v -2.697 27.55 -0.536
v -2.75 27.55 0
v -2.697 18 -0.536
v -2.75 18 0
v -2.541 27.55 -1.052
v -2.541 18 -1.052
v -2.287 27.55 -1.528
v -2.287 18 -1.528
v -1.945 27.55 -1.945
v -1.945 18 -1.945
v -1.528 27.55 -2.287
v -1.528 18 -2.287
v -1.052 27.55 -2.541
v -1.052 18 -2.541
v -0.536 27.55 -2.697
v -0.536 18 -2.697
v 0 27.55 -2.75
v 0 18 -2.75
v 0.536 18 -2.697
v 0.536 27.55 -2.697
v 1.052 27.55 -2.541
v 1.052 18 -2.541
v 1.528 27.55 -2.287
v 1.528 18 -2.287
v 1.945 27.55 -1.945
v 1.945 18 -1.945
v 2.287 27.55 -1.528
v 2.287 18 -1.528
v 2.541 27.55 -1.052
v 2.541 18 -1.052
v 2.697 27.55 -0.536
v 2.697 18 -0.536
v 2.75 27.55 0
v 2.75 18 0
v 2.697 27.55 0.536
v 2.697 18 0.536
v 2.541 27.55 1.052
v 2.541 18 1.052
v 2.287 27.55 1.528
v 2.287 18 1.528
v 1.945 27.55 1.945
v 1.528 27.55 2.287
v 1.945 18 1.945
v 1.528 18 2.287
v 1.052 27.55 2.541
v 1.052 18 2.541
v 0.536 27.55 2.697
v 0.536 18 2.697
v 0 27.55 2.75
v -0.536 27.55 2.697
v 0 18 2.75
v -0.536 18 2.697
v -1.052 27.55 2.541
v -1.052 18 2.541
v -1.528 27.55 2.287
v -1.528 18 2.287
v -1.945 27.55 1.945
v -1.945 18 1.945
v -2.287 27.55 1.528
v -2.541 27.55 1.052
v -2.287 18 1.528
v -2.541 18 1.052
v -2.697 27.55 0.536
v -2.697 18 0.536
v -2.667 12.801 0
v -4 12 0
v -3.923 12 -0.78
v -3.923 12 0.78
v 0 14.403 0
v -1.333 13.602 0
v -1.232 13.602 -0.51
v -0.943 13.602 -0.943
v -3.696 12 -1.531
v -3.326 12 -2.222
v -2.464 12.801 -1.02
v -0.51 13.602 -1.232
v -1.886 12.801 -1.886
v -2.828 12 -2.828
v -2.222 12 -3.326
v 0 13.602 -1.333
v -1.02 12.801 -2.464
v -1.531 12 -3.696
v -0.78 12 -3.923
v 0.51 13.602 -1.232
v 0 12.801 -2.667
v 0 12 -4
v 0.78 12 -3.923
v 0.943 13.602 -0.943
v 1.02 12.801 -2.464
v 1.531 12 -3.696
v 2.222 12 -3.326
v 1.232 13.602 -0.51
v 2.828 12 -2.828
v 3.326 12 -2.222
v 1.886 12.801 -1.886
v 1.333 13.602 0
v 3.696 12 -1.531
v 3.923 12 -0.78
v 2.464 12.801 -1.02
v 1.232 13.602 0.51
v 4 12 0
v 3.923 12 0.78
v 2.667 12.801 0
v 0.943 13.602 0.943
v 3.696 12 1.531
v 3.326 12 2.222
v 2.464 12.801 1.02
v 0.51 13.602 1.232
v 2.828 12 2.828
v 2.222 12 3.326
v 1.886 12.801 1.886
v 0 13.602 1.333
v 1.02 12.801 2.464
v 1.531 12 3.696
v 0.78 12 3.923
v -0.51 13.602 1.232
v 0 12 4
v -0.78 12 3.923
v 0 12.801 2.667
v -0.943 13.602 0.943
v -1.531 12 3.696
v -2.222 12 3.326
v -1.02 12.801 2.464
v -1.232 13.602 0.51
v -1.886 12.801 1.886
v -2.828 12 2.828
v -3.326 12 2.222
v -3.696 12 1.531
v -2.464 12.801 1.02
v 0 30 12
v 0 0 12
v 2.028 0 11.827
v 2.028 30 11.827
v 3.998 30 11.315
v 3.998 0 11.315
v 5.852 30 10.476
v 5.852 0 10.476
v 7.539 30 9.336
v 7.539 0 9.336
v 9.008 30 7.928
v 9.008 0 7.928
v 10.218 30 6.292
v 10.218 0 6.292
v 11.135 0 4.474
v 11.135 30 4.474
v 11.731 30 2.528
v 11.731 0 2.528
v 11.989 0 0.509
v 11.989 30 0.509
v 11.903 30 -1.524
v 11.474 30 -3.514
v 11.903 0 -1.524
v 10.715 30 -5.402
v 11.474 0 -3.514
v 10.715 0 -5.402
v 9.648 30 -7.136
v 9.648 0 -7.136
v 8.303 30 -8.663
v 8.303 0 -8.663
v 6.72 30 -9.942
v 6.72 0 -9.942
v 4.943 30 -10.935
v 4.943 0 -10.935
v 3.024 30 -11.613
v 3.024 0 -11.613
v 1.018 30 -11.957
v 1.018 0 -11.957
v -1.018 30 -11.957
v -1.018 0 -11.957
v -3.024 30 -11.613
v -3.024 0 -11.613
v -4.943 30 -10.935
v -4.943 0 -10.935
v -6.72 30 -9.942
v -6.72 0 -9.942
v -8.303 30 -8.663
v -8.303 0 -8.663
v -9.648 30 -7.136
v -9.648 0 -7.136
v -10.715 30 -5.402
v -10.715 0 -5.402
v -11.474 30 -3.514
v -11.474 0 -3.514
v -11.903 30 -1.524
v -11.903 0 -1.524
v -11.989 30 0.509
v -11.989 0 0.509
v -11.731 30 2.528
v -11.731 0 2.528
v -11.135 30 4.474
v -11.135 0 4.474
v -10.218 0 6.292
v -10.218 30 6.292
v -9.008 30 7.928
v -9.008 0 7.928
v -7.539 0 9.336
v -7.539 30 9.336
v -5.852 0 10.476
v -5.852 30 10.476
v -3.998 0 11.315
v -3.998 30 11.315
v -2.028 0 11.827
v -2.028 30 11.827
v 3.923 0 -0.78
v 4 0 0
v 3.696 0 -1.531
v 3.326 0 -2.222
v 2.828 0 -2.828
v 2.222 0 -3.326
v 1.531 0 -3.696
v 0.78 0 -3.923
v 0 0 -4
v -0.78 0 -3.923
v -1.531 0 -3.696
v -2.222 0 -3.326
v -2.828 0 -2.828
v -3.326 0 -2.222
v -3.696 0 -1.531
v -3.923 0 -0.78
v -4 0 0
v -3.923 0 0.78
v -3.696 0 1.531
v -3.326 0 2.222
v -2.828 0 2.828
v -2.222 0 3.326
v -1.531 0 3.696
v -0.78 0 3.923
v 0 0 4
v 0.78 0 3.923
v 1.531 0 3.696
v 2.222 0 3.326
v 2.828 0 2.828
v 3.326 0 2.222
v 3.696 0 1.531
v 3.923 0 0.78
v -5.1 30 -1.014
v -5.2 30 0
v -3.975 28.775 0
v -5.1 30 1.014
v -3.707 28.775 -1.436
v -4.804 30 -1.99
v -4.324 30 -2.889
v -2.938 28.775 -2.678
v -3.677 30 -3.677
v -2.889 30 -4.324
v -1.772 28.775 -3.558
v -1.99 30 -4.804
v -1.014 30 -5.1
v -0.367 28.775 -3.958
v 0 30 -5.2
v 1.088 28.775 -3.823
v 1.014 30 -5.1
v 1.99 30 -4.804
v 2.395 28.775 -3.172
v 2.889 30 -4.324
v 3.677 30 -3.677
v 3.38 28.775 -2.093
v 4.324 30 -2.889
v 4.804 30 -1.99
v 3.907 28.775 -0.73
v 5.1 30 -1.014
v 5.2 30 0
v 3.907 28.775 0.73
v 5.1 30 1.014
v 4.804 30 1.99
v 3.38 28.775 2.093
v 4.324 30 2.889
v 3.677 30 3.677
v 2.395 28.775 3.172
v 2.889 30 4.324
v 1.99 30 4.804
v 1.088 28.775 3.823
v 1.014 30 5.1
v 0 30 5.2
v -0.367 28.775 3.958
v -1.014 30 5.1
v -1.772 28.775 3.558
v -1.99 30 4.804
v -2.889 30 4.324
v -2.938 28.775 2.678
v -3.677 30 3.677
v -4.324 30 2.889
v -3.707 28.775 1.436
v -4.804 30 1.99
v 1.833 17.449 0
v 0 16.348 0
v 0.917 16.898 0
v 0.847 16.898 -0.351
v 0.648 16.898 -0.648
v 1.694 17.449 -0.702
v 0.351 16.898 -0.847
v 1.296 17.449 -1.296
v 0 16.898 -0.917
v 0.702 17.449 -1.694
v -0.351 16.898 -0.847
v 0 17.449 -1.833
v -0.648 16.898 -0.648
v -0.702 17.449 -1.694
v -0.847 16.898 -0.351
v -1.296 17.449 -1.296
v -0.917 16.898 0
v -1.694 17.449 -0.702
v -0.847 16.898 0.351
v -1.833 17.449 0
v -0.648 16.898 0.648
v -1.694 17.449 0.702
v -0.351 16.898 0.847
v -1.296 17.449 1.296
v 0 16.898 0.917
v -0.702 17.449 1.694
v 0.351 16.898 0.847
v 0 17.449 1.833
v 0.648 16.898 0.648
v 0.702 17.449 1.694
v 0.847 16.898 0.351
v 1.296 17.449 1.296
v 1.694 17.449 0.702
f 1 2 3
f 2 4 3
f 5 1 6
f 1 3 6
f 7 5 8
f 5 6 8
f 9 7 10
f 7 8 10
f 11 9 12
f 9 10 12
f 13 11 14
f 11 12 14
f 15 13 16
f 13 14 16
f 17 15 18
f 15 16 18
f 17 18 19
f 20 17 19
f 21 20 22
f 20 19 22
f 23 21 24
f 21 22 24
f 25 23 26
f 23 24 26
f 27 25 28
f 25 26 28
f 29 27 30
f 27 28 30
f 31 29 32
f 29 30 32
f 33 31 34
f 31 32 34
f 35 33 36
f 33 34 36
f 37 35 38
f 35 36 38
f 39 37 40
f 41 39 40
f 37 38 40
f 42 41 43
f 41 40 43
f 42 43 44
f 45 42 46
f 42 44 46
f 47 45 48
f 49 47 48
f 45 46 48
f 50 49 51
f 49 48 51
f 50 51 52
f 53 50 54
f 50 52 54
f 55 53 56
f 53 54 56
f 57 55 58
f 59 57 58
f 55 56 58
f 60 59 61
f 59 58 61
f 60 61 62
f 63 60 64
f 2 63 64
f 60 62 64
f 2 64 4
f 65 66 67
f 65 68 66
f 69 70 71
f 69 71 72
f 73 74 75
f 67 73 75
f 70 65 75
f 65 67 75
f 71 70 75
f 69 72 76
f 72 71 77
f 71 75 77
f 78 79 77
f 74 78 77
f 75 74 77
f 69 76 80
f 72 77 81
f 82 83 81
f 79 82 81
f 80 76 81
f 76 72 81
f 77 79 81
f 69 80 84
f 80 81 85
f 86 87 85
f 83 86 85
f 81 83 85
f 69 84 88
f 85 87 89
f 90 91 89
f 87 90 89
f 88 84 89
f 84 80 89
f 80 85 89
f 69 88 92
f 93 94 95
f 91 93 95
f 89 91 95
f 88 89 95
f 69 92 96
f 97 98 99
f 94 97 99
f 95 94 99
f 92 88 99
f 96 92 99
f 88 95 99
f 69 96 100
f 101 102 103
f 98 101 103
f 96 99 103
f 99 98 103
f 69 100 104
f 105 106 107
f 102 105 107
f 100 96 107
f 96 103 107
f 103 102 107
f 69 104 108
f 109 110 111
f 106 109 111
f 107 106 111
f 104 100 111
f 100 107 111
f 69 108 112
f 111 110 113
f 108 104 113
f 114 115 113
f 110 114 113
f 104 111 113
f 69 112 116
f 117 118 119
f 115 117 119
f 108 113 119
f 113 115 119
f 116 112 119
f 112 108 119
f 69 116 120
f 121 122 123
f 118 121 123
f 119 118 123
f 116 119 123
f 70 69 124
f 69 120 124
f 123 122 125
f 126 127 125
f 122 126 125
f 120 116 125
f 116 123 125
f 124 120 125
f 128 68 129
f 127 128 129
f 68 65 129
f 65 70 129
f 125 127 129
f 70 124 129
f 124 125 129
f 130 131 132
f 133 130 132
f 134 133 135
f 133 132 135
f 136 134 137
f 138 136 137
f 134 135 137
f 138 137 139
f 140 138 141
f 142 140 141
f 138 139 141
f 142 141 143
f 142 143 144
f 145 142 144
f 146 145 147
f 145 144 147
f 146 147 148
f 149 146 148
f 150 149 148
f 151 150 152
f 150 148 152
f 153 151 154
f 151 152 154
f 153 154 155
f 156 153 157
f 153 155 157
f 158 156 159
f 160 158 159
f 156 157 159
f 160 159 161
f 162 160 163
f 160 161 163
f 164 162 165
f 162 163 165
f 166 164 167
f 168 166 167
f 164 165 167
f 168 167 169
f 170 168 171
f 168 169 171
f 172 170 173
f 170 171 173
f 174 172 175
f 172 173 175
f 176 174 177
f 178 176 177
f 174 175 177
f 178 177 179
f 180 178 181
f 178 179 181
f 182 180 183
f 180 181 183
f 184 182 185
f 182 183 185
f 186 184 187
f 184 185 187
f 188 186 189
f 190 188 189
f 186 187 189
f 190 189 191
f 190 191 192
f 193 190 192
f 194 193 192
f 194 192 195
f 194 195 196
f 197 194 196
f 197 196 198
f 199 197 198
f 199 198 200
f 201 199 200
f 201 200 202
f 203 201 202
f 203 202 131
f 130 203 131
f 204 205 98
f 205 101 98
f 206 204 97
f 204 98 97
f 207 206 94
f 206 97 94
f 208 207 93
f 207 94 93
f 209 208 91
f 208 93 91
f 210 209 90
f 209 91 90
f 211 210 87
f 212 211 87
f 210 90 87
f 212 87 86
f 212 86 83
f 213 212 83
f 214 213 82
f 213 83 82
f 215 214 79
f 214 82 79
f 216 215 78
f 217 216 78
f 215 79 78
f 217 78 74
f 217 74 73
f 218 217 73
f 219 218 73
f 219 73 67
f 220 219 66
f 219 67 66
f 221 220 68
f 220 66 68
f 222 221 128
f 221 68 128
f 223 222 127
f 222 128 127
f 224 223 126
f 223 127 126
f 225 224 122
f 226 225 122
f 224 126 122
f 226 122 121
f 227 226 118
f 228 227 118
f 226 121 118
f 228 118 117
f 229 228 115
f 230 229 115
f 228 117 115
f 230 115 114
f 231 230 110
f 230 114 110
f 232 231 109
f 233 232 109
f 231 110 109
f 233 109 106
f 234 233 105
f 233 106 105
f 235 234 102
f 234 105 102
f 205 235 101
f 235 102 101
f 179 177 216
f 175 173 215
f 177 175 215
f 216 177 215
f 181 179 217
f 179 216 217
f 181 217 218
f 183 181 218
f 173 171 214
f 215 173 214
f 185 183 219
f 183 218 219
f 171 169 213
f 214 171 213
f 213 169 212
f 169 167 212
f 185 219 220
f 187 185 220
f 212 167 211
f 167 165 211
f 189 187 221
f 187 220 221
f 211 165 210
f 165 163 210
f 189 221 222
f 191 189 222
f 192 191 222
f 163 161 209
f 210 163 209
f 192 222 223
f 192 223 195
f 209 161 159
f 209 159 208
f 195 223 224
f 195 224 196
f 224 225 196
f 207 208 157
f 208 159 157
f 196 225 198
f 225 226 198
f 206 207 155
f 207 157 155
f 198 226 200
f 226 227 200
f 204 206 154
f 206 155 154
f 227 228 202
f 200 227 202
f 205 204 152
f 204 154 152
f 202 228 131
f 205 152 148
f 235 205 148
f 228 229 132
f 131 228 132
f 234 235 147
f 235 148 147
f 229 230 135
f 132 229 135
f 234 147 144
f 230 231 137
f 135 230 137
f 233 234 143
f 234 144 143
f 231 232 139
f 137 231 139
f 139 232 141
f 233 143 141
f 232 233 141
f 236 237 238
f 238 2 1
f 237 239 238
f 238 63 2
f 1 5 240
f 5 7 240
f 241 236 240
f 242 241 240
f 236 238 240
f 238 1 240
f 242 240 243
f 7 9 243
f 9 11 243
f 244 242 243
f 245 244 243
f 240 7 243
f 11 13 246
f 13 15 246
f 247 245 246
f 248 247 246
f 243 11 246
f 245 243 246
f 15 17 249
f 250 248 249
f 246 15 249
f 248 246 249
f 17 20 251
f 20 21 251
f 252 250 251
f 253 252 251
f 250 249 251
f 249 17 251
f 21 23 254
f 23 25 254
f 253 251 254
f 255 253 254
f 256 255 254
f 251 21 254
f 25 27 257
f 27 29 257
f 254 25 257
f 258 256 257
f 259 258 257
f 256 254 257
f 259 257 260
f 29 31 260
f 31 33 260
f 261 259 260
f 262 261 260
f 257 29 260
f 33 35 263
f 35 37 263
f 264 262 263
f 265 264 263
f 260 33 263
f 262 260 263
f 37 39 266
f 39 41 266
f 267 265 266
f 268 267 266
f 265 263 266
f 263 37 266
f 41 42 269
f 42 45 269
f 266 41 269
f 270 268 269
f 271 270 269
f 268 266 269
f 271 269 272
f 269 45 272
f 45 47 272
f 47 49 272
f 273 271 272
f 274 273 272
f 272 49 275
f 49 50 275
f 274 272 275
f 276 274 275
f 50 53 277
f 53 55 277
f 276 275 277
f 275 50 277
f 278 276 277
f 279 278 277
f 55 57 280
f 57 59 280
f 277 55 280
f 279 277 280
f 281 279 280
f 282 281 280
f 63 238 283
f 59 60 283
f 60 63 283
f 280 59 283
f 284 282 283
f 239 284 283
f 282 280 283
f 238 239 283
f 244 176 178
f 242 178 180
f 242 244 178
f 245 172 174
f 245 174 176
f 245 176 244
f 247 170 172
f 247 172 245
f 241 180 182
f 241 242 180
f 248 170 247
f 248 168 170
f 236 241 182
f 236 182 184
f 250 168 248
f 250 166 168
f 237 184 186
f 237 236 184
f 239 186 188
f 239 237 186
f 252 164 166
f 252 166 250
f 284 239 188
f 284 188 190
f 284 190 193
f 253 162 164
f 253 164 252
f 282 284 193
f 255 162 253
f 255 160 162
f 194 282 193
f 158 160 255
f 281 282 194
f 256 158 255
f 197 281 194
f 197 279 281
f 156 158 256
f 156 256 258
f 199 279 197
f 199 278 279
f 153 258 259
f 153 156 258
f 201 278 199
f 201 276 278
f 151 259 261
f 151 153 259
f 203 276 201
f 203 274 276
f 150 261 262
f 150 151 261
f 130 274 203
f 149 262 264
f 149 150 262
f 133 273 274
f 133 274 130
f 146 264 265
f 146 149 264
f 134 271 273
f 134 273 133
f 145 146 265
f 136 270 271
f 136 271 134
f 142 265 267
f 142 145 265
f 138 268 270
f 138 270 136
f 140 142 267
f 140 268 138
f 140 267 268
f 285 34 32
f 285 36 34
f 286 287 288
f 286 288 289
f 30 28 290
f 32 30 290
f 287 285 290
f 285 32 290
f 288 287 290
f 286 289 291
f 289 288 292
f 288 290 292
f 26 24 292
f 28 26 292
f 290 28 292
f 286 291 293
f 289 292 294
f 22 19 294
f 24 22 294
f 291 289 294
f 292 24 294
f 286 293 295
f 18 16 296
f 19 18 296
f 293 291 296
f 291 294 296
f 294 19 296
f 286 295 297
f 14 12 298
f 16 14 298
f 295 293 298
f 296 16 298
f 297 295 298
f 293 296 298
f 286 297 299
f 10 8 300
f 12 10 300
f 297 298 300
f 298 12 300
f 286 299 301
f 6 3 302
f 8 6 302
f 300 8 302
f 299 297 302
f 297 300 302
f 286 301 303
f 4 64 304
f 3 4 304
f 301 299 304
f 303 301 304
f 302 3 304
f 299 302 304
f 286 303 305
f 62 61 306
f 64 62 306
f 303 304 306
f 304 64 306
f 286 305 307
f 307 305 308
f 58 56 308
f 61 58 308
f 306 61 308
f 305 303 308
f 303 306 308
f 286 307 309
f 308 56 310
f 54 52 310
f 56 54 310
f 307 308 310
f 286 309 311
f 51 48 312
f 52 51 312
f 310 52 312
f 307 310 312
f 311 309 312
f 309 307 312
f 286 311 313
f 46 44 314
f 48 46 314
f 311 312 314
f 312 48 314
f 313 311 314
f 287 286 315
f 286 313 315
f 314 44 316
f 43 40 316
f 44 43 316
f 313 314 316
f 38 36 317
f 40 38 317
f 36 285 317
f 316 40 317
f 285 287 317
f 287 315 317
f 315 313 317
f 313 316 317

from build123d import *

# Parameters (mm, degrees)
SKETCH1_R                                           = 12
BOSS_EXTRUDE1_DEPTH                                 = 30
CSK_FOR_M5_COUNTERSUNK_FLAT_HEAD_SCREW1_D           = 5.5
CSK_FOR_M5_COUNTERSUNK_FLAT_HEAD_SCREW1_DEPTH       = 12
CSK_FOR_M5_COUNTERSUNK_FLAT_HEAD_SCREW1_CSINK_D     = 10.4
CSK_FOR_M5_COUNTERSUNK_FLAT_HEAD_SCREW1_CSINK_ANGLE = 90
CSK_FOR_M5_COUNTERSUNK_FLAT_HEAD_SCREW1_TIP         = 1.652366702
F_8_0MM_DOWEL_HOLE1_D                               = 8
F_8_0MM_DOWEL_HOLE1_DEPTH                           = 12
F_8_0MM_DOWEL_HOLE1_TIP                             = 2.403442476


with BuildPart() as part:
    # Sketch1 → Boss-Extrude1 (new body)
    with BuildSketch(Plane(origin=(0, 0, 0), x_dir=(1, 0, 0), z_dir=(0, 1, 0))):
        with Locations(Location((0, 0, 0), (0, 0, 270))):
            Circle(SKETCH1_R)
    extrude(amount=BOSS_EXTRUDE1_DEPTH)

    # CSK for M5 Countersunk Flat Head Screw1
    with Locations(Plane(origin=(0, 30, 0), x_dir=(1, 0, 0), z_dir=(0, 1, 0))):
        with Locations((0, 0)):
            CounterSinkHole(CSK_FOR_M5_COUNTERSUNK_FLAT_HEAD_SCREW1_D / 2, CSK_FOR_M5_COUNTERSUNK_FLAT_HEAD_SCREW1_CSINK_D / 2, depth=CSK_FOR_M5_COUNTERSUNK_FLAT_HEAD_SCREW1_DEPTH, counter_sink_angle=CSK_FOR_M5_COUNTERSUNK_FLAT_HEAD_SCREW1_CSINK_ANGLE)
            with Locations((0, 0, -(CSK_FOR_M5_COUNTERSUNK_FLAT_HEAD_SCREW1_DEPTH + CSK_FOR_M5_COUNTERSUNK_FLAT_HEAD_SCREW1_TIP / 2))):  # 118° drill point
                Cone(0, CSK_FOR_M5_COUNTERSUNK_FLAT_HEAD_SCREW1_D / 2, CSK_FOR_M5_COUNTERSUNK_FLAT_HEAD_SCREW1_TIP, mode=Mode.SUBTRACT)

    # Ø8.0mm Dowel Hole1
    with Locations(Plane(origin=(0, 0, 0), x_dir=(-1, 0, 0), z_dir=(0, -1, 0))):
        with Locations((0, 0)):
            Hole(F_8_0MM_DOWEL_HOLE1_D / 2, depth=F_8_0MM_DOWEL_HOLE1_DEPTH)
            with Locations((0, 0, -(F_8_0MM_DOWEL_HOLE1_DEPTH + F_8_0MM_DOWEL_HOLE1_TIP / 2))):  # 118° drill point
                Cone(0, F_8_0MM_DOWEL_HOLE1_D / 2, F_8_0MM_DOWEL_HOLE1_TIP, mode=Mode.SUBTRACT)


solid = part.part
